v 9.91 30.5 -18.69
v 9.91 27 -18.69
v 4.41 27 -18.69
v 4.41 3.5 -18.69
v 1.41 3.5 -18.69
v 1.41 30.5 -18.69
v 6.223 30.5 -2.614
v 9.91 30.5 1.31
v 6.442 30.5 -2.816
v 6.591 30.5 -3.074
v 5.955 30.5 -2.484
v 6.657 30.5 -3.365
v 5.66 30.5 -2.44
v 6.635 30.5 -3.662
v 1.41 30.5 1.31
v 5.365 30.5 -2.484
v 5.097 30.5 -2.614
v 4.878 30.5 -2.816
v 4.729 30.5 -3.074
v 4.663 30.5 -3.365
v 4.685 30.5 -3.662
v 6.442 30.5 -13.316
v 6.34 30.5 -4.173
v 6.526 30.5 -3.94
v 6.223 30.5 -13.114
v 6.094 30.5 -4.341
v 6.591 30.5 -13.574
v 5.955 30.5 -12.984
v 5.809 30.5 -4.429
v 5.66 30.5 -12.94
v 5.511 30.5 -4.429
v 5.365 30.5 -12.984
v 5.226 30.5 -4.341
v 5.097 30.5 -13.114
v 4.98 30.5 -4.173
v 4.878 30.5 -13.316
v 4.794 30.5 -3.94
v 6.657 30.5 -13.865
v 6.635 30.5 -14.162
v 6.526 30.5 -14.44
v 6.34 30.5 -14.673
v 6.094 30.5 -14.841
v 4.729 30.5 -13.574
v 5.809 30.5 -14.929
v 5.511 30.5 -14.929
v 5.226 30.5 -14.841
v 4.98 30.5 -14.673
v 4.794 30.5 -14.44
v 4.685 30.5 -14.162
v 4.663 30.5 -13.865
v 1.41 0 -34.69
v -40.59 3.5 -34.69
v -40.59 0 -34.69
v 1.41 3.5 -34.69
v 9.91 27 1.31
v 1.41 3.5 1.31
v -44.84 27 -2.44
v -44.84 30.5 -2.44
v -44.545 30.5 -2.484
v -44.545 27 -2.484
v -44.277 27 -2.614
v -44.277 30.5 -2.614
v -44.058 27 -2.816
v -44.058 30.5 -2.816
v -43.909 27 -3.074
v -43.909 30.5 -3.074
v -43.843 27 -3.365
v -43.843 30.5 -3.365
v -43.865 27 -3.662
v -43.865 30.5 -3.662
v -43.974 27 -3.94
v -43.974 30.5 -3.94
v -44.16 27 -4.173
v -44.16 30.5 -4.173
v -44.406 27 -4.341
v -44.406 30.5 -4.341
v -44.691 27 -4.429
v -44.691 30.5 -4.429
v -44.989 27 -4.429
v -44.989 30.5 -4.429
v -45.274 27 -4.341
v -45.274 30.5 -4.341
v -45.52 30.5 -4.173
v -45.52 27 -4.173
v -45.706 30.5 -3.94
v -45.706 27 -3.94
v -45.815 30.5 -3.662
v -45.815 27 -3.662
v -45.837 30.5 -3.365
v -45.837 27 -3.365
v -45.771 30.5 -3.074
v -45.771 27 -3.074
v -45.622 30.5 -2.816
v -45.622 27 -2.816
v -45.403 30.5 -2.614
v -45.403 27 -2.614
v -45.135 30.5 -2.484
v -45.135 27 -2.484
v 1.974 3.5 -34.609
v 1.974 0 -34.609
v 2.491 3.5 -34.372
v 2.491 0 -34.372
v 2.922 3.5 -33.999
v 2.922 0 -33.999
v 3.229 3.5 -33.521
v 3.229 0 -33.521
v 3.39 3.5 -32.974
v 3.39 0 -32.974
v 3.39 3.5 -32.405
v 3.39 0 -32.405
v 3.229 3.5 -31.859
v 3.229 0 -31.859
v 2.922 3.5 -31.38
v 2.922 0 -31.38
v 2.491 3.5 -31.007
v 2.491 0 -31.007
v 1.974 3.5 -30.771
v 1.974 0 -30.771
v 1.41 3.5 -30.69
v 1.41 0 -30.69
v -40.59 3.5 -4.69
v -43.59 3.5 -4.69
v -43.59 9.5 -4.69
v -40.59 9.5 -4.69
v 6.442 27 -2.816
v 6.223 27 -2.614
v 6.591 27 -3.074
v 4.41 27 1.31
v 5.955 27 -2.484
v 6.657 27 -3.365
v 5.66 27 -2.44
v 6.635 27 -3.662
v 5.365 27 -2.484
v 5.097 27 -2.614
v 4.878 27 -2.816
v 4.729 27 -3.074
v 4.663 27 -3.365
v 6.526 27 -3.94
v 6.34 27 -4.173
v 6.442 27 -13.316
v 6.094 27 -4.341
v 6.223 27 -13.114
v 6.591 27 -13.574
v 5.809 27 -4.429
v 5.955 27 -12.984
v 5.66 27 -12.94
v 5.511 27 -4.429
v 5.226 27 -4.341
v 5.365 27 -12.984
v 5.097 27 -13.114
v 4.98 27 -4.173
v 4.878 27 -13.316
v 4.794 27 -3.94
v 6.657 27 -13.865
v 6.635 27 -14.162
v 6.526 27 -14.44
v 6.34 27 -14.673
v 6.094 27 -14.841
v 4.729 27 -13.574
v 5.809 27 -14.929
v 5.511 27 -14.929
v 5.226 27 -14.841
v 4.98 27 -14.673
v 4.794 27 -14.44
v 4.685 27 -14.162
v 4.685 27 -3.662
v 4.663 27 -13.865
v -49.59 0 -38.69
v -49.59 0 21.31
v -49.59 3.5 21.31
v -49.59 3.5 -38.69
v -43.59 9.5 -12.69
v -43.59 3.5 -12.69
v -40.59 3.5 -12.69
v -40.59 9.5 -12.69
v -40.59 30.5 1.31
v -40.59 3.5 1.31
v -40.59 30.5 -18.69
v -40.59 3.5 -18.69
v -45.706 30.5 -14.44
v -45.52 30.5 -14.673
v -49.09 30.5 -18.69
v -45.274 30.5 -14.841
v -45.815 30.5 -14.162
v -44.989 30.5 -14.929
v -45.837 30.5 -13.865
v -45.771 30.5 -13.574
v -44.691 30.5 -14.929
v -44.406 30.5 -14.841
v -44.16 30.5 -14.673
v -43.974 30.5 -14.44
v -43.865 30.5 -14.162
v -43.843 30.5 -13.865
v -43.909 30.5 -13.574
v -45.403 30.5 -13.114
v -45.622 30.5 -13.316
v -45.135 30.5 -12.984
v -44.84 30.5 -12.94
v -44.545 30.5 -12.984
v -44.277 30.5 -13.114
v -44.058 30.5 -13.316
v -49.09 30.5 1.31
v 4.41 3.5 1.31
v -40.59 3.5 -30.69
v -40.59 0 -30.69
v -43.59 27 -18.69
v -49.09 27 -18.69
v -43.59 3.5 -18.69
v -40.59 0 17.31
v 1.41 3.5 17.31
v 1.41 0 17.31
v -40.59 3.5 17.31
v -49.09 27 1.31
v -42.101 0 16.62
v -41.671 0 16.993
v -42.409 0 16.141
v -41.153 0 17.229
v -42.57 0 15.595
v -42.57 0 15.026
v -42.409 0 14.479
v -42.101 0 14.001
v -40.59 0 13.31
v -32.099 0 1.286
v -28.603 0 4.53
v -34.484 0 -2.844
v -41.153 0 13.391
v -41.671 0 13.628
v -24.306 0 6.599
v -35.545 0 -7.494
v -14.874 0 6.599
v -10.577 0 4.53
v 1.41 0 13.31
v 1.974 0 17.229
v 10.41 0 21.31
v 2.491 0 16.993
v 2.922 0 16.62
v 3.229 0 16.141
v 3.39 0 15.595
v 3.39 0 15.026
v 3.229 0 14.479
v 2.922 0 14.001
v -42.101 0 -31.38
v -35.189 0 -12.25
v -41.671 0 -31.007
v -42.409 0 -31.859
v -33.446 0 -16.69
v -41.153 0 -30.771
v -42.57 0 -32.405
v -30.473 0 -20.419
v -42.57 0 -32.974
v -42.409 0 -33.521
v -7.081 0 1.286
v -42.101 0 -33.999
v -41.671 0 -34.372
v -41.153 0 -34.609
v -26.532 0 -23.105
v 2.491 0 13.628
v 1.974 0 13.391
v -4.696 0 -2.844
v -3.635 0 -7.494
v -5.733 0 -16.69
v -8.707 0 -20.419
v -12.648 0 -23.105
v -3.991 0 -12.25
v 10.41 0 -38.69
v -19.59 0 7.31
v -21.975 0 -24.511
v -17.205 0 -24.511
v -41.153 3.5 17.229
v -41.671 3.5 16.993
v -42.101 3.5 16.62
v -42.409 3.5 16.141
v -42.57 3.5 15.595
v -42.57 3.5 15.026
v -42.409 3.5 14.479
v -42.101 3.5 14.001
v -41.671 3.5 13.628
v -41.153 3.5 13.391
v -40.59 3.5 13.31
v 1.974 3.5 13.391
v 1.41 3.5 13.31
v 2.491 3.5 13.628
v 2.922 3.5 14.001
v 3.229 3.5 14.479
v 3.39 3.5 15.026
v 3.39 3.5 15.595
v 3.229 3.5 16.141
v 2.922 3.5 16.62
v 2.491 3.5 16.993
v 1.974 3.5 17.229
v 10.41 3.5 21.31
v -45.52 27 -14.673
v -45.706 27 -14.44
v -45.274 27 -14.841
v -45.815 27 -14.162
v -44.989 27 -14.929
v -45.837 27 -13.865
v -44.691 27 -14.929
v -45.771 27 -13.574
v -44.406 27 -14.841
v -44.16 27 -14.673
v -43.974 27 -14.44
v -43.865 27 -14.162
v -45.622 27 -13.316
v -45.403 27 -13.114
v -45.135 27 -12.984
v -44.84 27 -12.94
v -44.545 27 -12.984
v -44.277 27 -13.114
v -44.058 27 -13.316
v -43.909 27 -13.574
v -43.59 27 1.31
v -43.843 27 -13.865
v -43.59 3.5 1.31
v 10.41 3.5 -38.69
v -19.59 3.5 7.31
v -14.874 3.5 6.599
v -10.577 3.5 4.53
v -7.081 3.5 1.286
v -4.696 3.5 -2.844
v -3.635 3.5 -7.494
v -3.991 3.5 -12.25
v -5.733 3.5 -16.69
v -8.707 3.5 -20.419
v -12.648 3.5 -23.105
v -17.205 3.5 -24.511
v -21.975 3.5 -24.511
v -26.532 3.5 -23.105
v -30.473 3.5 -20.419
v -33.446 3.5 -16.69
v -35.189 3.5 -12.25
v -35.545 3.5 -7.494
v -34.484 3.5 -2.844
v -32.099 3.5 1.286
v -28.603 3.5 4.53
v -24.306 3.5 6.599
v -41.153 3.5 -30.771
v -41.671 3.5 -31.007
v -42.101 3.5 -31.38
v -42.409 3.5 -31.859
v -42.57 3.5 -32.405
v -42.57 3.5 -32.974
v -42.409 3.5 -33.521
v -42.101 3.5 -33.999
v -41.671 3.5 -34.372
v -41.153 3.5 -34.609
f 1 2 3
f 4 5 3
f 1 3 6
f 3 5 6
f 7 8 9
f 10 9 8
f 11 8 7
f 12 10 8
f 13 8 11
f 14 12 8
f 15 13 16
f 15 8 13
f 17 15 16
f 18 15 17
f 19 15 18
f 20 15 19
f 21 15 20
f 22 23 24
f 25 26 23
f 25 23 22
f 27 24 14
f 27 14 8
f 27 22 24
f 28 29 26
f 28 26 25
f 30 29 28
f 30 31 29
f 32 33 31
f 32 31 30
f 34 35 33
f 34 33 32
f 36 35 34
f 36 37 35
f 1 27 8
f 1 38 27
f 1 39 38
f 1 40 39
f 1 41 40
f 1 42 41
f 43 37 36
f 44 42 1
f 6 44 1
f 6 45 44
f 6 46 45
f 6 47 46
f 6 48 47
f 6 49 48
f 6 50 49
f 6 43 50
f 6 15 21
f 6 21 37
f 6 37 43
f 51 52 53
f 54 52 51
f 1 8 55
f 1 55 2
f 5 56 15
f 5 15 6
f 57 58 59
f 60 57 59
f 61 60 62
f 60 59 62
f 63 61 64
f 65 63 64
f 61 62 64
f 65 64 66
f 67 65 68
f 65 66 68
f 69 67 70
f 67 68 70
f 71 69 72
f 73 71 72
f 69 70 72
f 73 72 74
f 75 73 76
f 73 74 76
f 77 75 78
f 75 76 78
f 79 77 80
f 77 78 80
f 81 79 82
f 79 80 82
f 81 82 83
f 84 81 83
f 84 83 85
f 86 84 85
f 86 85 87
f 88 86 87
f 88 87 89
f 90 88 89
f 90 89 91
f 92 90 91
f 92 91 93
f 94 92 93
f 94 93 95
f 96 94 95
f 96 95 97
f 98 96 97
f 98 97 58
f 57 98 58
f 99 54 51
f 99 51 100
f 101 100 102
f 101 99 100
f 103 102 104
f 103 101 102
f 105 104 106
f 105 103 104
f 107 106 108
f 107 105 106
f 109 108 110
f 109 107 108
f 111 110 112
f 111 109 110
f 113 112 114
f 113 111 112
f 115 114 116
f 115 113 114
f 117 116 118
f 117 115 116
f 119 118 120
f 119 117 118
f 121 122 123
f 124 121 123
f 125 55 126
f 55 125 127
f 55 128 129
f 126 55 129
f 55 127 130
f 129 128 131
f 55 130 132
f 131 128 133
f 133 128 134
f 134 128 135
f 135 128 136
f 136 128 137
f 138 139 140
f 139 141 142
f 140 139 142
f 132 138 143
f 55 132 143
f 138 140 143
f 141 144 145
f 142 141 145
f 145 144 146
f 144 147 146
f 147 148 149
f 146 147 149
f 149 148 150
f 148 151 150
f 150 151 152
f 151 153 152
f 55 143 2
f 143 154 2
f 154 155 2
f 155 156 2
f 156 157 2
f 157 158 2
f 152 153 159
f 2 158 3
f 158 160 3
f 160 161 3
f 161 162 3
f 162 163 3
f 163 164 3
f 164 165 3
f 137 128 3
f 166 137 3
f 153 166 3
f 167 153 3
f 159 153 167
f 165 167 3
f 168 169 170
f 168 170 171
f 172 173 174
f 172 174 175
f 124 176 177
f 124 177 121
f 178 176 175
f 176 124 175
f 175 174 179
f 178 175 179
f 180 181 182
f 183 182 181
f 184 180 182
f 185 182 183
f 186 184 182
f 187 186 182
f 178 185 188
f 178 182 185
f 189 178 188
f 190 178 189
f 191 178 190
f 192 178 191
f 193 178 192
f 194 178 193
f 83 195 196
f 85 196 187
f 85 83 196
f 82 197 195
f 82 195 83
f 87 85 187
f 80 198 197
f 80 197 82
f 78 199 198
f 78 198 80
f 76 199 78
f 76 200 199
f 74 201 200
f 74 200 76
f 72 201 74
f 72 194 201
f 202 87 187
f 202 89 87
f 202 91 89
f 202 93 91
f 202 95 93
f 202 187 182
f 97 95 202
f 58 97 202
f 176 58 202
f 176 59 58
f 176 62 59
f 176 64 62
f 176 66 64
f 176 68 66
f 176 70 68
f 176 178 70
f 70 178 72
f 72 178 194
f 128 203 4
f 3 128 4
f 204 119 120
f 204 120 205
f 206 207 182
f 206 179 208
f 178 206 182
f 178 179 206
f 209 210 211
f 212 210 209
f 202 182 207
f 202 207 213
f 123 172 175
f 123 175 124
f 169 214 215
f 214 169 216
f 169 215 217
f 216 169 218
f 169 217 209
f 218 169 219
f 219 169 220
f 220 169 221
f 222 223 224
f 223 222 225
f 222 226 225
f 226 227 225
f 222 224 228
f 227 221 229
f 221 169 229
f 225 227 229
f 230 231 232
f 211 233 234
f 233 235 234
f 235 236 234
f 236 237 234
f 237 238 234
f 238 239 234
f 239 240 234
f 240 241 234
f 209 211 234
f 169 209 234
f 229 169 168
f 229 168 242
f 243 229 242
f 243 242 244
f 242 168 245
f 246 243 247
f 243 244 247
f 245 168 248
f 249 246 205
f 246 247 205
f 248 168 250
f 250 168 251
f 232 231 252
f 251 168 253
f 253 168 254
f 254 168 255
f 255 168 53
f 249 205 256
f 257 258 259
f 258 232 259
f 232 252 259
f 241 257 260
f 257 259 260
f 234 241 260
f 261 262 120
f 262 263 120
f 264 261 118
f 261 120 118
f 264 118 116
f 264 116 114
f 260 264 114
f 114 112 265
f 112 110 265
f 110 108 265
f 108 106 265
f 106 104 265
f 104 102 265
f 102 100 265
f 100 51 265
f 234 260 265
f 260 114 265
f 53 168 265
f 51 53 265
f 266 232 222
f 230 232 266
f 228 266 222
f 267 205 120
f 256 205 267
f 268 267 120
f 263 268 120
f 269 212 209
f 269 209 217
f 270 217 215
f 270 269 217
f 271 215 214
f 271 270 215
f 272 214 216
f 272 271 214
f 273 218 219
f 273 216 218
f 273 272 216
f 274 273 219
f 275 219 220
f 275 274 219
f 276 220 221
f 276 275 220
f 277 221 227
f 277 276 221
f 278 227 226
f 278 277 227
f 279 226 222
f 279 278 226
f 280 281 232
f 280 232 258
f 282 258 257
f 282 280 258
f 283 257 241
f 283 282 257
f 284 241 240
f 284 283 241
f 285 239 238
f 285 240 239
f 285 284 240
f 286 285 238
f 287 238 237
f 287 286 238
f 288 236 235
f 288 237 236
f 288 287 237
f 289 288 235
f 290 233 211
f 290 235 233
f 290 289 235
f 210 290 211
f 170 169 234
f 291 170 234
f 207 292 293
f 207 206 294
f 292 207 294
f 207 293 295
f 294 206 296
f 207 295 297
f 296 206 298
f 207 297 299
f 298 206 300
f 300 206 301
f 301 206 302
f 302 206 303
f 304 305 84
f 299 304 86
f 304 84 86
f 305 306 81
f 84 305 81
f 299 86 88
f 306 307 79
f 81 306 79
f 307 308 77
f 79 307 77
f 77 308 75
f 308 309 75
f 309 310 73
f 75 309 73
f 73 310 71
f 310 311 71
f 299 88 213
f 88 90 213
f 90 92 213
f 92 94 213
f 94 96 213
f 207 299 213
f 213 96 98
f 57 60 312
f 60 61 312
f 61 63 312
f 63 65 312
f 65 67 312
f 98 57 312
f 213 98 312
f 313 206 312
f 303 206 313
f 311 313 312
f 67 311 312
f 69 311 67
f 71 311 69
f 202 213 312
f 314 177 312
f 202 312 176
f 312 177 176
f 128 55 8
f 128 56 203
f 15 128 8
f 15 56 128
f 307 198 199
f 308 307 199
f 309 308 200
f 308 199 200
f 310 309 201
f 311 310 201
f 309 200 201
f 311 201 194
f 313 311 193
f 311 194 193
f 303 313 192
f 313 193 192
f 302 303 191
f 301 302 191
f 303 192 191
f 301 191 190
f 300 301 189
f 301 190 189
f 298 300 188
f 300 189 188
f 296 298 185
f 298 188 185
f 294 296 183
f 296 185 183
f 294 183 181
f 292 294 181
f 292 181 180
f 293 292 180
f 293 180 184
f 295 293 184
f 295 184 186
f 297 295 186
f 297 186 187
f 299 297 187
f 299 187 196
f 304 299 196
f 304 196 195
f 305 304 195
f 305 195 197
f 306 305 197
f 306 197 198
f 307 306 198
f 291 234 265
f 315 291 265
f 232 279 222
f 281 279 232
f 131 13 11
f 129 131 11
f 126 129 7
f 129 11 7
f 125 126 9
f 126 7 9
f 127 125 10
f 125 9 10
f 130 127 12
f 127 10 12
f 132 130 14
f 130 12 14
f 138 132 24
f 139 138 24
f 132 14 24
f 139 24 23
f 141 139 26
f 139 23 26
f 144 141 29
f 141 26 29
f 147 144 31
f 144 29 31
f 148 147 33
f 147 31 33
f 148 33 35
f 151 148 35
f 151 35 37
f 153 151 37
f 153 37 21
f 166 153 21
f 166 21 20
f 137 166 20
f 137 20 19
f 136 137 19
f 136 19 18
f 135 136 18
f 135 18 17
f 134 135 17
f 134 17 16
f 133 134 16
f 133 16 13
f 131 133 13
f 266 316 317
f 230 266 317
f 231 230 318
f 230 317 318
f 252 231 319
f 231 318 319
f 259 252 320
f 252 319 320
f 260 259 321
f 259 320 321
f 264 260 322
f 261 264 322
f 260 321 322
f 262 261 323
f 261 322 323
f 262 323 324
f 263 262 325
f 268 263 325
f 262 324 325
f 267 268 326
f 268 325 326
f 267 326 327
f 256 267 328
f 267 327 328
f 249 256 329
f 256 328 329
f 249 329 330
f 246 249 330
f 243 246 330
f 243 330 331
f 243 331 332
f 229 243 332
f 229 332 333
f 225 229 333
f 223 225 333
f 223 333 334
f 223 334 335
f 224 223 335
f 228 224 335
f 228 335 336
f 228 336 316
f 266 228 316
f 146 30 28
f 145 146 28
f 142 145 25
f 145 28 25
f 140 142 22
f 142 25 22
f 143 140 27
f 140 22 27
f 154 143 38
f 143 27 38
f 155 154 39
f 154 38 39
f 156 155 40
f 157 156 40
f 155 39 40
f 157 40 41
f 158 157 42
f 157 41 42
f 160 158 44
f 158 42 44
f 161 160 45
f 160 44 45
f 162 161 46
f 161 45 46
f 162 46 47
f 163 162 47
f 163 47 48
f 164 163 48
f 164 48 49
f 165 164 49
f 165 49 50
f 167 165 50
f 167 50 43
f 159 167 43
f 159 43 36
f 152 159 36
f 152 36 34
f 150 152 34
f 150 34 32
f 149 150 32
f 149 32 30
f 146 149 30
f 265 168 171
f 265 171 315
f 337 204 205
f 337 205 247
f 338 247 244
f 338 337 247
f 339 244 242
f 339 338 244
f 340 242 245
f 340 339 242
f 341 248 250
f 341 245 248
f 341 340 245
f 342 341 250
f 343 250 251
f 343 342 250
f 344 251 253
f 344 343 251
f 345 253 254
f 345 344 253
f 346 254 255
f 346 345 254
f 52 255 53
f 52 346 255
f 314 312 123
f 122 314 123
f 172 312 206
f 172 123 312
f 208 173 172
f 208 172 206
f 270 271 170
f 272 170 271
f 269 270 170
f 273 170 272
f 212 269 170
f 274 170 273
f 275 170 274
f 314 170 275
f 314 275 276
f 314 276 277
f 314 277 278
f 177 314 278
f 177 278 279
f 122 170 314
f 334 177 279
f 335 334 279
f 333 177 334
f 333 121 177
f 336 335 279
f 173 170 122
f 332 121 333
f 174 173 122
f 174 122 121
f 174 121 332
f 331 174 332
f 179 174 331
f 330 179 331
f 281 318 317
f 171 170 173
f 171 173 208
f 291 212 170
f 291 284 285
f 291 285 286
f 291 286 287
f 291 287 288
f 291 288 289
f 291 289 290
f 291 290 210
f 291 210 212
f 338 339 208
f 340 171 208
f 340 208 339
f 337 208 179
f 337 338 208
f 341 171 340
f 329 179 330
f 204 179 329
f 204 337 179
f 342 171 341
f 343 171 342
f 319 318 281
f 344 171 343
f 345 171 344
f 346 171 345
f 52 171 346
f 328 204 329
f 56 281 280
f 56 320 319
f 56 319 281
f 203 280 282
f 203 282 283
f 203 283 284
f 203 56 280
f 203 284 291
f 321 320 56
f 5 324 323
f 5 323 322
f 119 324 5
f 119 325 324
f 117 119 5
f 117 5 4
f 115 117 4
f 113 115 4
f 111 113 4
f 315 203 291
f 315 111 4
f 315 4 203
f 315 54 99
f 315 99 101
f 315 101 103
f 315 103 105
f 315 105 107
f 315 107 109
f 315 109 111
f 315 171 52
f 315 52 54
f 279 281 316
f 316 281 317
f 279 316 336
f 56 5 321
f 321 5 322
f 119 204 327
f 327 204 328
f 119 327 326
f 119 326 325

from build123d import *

# Parameters (mm, degrees)
CROQUIS1_W              = 60
CROQUIS1_H              = 60
SALIENTE_EXTRUIR1_DEPTH = 3.5
CROQUIS2_W              = 3
CROQUIS2_H              = 20
SALIENTE_EXTRUIR4_DEPTH = 27
CROQUIS7_R              = 16
CORTAR_EXTRUIR2_DEPTH   = 5
CORTAR_EXTRUIR3_DEPTH   = 5
CROQUIS9_W              = 20
CROQUIS9_H              = 3.5
SALIENTE_EXTRUIR5_DEPTH = 5.5
CROQUIS10_W             = 20
CROQUIS10_H             = 3.5
SALIENTE_EXTRUIR6_DEPTH = 5.5
CROQUIS11_R             = 1
CORTAR_EXTRUIR4_DEPTH   = 5.5
CROQUIS13_R             = 1
CORTAR_EXTRUIR5_DEPTH   = 5.5
CROQUIS14_W             = 8
CROQUIS14_H             = 6
CORTAR_EXTRUIR6_DEPTH   = 10


with BuildPart() as part:
    # Croquis1 → Saliente-Extruir1 (new body)
    with BuildSketch(Plane(origin=(0, 0, 0), x_dir=(1, 0, 0), z_dir=(0, 1, 0))):
        with Locations((-19.589863428, 8.689761392)):
            Rectangle(CROQUIS1_W, CROQUIS1_H)
    extrude(amount=SALIENTE_EXTRUIR1_DEPTH)

    # Croquis2 → Saliente-Extruir4 (add)
    with BuildSketch(Plane(origin=(0, 3.5, 0), x_dir=(1, 0, 0), z_dir=(0, 1, 0))):
        with Locations((2.910136572, 8.689761392)):
            Rectangle(CROQUIS2_W, CROQUIS2_H)
        with Locations((-42.089863428, 8.689761392)):
            Rectangle(CROQUIS2_W, CROQUIS2_H)
    extrude(amount=SALIENTE_EXTRUIR4_DEPTH)

    # Croquis7 → Cortar-Extruir2 (cut)
    with BuildSketch(Plane(origin=(0, 3.5, 0), x_dir=(1, 0, 0), z_dir=(0, 1, 0))):
        with Locations(Location((-19.589863428, 8.689761392, 0), (0, 0, 270))):
            Circle(CROQUIS7_R)
    extrude(amount=-CORTAR_EXTRUIR2_DEPTH, mode=Mode.SUBTRACT)

    # Croquis8 → Cortar-Extruir3 (cut)
    with BuildSketch(Plane(origin=(0, 3.5, 0), x_dir=(1, 0, 0), z_dir=(0, 1, 0))):
        with BuildLine():
            Line((1.410136572, -17.310238608), (-40.589863428, -17.310238608))
            ThreePointArc((-40.589863428, -17.310238608), (-42.589863428, -15.310238608), (-40.589863428, -13.310238608))
            Line((-40.589863428, -13.310238608), (1.410136572, -13.310238608))
            ThreePointArc((1.410136572, -13.310238608), (3.410136572, -15.310238608), (1.410136572, -17.310238608))
        make_face()
        with BuildLine():
            Line((1.410136572, 30.689761392), (-40.589863428, 30.689761392))
            ThreePointArc((-40.589863428, 30.689761392), (-42.589863428, 32.689761392), (-40.589863428, 34.689761392))
            Line((-40.589863428, 34.689761392), (1.410136572, 34.689761392))
            ThreePointArc((1.410136572, 34.689761392), (3.410136572, 32.689761392), (1.410136572, 30.689761392))
        make_face()
    extrude(amount=-CORTAR_EXTRUIR3_DEPTH, mode=Mode.SUBTRACT)

    # Croquis9 → Saliente-Extruir5 (add)
    with BuildSketch(Plane(origin=(4.410136572, 0, 0), x_dir=(0, 0, -1), z_dir=(1, 0, 0))):
        with Locations((8.689761392, 28.75)):
            Rectangle(CROQUIS9_W, CROQUIS9_H)
    extrude(amount=SALIENTE_EXTRUIR5_DEPTH)

    # Croquis10 → Saliente-Extruir6 (add)
    with BuildSketch(Plane.ZY.offset(43.589863428)):
        with Locations((-8.689761392, 28.75)):
            Rectangle(CROQUIS10_W, CROQUIS10_H)
    extrude(amount=SALIENTE_EXTRUIR6_DEPTH)

    # Croquis11 → Cortar-Extruir4 (cut)
    with BuildSketch(Plane(origin=(0, 30.5, 0), x_dir=(1, 0, 0), z_dir=(0, 1, 0))):
        with Locations(Location((-44.839863428, 3.439761392, 0), (0, 0, 270))):
            Circle(CROQUIS11_R)
        with Locations(Location((-44.839863428, 13.939761392, 0), (0, 0, 270))):
            Circle(CROQUIS11_R)
    extrude(amount=-CORTAR_EXTRUIR4_DEPTH, mode=Mode.SUBTRACT)

    # Croquis13 → Cortar-Extruir5 (cut)
    with BuildSketch(Plane(origin=(0, 30.5, 0), x_dir=(1, 0, 0), z_dir=(0, 1, 0))):
        with Locations(Location((5.660136572, 3.439761392, 0), (0, 0, 270))):
            Circle(CROQUIS13_R)
        with Locations(Location((5.660136572, 13.939761392, 0), (0, 0, 270))):
            Circle(CROQUIS13_R)
    extrude(amount=-CORTAR_EXTRUIR5_DEPTH, mode=Mode.SUBTRACT)

    # Croquis14 → Cortar-Extruir6 (cut)
    with BuildSketch(Plane.ZY.offset(43.589863428)):
        with Locations((-8.689761392, 6.5)):
            Rectangle(CROQUIS14_W, CROQUIS14_H)
    extrude(amount=-CORTAR_EXTRUIR6_DEPTH, mode=Mode.SUBTRACT)


solid = part.part
